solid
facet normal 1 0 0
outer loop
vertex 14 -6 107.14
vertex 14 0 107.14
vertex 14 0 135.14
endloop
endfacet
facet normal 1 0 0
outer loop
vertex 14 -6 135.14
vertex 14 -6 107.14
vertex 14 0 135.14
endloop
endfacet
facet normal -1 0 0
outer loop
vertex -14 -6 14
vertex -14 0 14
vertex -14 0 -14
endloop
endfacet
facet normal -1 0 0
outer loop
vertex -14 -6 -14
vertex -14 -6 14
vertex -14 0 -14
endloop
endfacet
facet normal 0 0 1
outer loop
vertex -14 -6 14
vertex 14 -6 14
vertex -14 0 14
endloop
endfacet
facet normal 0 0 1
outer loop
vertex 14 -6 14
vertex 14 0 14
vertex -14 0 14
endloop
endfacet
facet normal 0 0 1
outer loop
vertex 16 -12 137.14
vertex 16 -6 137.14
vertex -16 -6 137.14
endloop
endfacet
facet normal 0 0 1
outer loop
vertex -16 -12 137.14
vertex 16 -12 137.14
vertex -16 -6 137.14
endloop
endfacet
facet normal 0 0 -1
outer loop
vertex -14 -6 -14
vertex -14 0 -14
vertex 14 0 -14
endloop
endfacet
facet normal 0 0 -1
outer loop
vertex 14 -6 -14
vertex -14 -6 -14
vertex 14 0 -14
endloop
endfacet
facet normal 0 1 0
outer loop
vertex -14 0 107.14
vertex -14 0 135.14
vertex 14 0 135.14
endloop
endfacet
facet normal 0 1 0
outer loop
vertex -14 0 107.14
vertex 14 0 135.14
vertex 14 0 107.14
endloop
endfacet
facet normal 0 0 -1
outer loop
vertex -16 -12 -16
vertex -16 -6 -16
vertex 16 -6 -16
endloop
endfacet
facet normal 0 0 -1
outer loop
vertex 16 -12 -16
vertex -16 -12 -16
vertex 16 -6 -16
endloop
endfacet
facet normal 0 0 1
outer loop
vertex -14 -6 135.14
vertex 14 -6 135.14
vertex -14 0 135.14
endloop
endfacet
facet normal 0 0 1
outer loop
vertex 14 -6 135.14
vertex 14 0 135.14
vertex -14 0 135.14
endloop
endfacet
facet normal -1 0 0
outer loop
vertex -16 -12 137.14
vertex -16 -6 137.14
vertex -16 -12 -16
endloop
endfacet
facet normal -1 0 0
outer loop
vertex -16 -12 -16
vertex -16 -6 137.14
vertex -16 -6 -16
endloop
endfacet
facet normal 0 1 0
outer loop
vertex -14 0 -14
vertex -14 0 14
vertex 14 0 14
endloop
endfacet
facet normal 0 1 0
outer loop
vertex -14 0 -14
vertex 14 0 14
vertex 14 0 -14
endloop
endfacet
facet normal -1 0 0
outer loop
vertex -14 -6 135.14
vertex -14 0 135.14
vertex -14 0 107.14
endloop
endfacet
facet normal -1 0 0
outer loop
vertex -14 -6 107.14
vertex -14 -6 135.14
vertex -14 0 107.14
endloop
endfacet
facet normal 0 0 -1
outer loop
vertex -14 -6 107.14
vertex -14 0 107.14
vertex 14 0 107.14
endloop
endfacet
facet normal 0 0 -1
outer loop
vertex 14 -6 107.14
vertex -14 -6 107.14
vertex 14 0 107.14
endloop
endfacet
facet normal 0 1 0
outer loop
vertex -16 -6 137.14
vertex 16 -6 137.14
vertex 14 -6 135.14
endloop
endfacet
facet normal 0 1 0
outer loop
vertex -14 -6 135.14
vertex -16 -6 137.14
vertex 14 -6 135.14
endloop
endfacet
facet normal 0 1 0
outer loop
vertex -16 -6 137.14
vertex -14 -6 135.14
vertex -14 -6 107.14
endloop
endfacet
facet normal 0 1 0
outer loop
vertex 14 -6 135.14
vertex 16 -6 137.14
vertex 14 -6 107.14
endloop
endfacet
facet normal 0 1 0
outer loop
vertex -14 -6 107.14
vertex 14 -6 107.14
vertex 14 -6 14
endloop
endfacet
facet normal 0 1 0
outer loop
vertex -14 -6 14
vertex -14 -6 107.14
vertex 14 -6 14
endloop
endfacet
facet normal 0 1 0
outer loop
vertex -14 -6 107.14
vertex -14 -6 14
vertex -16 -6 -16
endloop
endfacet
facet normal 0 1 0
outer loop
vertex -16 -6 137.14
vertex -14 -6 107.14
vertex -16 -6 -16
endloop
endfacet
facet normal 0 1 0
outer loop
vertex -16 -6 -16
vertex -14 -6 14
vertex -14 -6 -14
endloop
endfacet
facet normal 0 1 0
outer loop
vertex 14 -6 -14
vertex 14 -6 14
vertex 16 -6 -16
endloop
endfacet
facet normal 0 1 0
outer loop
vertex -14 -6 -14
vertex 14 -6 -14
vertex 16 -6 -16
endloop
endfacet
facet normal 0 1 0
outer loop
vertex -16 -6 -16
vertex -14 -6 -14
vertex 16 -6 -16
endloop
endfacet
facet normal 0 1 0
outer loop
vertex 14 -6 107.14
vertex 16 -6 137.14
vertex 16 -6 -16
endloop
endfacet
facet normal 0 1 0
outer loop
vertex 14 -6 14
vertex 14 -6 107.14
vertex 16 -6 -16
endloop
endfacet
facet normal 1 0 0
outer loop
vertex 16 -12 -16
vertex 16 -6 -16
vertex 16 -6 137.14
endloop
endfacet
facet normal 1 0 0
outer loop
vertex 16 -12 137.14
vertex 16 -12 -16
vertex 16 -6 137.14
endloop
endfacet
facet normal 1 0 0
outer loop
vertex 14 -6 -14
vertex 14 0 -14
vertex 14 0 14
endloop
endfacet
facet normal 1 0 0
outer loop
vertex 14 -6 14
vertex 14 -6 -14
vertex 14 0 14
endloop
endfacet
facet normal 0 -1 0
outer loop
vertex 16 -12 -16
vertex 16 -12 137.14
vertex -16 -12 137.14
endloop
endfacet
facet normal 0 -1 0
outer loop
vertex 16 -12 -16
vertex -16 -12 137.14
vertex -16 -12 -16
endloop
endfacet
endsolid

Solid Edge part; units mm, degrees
sketch "Sketch1" plane through (0, 0, 0) normal (0, -1, 0) x (1, 0, 0)
  line L0 (14, -14) -> (14, 14)
  line L1 (14, 14) -> (-14, 14)
  line L2 (-14, 14) -> (-14, -14)
  line L3 (-14, -14) -> (14, -14)
extrude "Protrusion1" add sketch "Sketch1" along normal blind 6
sketch "Sketch2" plane through (0, -6, 0) normal (0, -1, 0) x (1, 0, 0)
  line L0 (16, 16) -> (-16, 16)
  line L1 (-16, 16) -> (-16, -16)
  line L2 (-16, -16) -> (16, -16)
  line L3 (16, -16) -> (16, 16)
  dimension "D1" = 2
extrude "ExtrudedProtrusion_2" add sketch "Sketch2" along normal blind 6
sketch "Sketch3" plane through (0, -9, 16) normal (0, 0, 1) x (-1, 0, 0)
  line L0 (16, 3) -> (16, -3)
  line L1 (16, -3) -> (-16, -3)
  line L2 (-16, -3) -> (-16, 3)
  line L3 (-16, 3) -> (16, 3)
extrude "ExtrudedProtrusion_3" add sketch "Sketch3" along normal blind 44.57
mirror "Mirror1" about plane through (0, -9, 60.57) normal (0, 0, 1) of "Protrusion1", "ExtrudedProtrusion_2", "ExtrudedProtrusion_3"
mirror "Mirror2" about plane through (0, -9, 60.57) normal (0, 0, 1) of "Protrusion1", "ExtrudedProtrusion_3", "ExtrudedProtrusion_2"
